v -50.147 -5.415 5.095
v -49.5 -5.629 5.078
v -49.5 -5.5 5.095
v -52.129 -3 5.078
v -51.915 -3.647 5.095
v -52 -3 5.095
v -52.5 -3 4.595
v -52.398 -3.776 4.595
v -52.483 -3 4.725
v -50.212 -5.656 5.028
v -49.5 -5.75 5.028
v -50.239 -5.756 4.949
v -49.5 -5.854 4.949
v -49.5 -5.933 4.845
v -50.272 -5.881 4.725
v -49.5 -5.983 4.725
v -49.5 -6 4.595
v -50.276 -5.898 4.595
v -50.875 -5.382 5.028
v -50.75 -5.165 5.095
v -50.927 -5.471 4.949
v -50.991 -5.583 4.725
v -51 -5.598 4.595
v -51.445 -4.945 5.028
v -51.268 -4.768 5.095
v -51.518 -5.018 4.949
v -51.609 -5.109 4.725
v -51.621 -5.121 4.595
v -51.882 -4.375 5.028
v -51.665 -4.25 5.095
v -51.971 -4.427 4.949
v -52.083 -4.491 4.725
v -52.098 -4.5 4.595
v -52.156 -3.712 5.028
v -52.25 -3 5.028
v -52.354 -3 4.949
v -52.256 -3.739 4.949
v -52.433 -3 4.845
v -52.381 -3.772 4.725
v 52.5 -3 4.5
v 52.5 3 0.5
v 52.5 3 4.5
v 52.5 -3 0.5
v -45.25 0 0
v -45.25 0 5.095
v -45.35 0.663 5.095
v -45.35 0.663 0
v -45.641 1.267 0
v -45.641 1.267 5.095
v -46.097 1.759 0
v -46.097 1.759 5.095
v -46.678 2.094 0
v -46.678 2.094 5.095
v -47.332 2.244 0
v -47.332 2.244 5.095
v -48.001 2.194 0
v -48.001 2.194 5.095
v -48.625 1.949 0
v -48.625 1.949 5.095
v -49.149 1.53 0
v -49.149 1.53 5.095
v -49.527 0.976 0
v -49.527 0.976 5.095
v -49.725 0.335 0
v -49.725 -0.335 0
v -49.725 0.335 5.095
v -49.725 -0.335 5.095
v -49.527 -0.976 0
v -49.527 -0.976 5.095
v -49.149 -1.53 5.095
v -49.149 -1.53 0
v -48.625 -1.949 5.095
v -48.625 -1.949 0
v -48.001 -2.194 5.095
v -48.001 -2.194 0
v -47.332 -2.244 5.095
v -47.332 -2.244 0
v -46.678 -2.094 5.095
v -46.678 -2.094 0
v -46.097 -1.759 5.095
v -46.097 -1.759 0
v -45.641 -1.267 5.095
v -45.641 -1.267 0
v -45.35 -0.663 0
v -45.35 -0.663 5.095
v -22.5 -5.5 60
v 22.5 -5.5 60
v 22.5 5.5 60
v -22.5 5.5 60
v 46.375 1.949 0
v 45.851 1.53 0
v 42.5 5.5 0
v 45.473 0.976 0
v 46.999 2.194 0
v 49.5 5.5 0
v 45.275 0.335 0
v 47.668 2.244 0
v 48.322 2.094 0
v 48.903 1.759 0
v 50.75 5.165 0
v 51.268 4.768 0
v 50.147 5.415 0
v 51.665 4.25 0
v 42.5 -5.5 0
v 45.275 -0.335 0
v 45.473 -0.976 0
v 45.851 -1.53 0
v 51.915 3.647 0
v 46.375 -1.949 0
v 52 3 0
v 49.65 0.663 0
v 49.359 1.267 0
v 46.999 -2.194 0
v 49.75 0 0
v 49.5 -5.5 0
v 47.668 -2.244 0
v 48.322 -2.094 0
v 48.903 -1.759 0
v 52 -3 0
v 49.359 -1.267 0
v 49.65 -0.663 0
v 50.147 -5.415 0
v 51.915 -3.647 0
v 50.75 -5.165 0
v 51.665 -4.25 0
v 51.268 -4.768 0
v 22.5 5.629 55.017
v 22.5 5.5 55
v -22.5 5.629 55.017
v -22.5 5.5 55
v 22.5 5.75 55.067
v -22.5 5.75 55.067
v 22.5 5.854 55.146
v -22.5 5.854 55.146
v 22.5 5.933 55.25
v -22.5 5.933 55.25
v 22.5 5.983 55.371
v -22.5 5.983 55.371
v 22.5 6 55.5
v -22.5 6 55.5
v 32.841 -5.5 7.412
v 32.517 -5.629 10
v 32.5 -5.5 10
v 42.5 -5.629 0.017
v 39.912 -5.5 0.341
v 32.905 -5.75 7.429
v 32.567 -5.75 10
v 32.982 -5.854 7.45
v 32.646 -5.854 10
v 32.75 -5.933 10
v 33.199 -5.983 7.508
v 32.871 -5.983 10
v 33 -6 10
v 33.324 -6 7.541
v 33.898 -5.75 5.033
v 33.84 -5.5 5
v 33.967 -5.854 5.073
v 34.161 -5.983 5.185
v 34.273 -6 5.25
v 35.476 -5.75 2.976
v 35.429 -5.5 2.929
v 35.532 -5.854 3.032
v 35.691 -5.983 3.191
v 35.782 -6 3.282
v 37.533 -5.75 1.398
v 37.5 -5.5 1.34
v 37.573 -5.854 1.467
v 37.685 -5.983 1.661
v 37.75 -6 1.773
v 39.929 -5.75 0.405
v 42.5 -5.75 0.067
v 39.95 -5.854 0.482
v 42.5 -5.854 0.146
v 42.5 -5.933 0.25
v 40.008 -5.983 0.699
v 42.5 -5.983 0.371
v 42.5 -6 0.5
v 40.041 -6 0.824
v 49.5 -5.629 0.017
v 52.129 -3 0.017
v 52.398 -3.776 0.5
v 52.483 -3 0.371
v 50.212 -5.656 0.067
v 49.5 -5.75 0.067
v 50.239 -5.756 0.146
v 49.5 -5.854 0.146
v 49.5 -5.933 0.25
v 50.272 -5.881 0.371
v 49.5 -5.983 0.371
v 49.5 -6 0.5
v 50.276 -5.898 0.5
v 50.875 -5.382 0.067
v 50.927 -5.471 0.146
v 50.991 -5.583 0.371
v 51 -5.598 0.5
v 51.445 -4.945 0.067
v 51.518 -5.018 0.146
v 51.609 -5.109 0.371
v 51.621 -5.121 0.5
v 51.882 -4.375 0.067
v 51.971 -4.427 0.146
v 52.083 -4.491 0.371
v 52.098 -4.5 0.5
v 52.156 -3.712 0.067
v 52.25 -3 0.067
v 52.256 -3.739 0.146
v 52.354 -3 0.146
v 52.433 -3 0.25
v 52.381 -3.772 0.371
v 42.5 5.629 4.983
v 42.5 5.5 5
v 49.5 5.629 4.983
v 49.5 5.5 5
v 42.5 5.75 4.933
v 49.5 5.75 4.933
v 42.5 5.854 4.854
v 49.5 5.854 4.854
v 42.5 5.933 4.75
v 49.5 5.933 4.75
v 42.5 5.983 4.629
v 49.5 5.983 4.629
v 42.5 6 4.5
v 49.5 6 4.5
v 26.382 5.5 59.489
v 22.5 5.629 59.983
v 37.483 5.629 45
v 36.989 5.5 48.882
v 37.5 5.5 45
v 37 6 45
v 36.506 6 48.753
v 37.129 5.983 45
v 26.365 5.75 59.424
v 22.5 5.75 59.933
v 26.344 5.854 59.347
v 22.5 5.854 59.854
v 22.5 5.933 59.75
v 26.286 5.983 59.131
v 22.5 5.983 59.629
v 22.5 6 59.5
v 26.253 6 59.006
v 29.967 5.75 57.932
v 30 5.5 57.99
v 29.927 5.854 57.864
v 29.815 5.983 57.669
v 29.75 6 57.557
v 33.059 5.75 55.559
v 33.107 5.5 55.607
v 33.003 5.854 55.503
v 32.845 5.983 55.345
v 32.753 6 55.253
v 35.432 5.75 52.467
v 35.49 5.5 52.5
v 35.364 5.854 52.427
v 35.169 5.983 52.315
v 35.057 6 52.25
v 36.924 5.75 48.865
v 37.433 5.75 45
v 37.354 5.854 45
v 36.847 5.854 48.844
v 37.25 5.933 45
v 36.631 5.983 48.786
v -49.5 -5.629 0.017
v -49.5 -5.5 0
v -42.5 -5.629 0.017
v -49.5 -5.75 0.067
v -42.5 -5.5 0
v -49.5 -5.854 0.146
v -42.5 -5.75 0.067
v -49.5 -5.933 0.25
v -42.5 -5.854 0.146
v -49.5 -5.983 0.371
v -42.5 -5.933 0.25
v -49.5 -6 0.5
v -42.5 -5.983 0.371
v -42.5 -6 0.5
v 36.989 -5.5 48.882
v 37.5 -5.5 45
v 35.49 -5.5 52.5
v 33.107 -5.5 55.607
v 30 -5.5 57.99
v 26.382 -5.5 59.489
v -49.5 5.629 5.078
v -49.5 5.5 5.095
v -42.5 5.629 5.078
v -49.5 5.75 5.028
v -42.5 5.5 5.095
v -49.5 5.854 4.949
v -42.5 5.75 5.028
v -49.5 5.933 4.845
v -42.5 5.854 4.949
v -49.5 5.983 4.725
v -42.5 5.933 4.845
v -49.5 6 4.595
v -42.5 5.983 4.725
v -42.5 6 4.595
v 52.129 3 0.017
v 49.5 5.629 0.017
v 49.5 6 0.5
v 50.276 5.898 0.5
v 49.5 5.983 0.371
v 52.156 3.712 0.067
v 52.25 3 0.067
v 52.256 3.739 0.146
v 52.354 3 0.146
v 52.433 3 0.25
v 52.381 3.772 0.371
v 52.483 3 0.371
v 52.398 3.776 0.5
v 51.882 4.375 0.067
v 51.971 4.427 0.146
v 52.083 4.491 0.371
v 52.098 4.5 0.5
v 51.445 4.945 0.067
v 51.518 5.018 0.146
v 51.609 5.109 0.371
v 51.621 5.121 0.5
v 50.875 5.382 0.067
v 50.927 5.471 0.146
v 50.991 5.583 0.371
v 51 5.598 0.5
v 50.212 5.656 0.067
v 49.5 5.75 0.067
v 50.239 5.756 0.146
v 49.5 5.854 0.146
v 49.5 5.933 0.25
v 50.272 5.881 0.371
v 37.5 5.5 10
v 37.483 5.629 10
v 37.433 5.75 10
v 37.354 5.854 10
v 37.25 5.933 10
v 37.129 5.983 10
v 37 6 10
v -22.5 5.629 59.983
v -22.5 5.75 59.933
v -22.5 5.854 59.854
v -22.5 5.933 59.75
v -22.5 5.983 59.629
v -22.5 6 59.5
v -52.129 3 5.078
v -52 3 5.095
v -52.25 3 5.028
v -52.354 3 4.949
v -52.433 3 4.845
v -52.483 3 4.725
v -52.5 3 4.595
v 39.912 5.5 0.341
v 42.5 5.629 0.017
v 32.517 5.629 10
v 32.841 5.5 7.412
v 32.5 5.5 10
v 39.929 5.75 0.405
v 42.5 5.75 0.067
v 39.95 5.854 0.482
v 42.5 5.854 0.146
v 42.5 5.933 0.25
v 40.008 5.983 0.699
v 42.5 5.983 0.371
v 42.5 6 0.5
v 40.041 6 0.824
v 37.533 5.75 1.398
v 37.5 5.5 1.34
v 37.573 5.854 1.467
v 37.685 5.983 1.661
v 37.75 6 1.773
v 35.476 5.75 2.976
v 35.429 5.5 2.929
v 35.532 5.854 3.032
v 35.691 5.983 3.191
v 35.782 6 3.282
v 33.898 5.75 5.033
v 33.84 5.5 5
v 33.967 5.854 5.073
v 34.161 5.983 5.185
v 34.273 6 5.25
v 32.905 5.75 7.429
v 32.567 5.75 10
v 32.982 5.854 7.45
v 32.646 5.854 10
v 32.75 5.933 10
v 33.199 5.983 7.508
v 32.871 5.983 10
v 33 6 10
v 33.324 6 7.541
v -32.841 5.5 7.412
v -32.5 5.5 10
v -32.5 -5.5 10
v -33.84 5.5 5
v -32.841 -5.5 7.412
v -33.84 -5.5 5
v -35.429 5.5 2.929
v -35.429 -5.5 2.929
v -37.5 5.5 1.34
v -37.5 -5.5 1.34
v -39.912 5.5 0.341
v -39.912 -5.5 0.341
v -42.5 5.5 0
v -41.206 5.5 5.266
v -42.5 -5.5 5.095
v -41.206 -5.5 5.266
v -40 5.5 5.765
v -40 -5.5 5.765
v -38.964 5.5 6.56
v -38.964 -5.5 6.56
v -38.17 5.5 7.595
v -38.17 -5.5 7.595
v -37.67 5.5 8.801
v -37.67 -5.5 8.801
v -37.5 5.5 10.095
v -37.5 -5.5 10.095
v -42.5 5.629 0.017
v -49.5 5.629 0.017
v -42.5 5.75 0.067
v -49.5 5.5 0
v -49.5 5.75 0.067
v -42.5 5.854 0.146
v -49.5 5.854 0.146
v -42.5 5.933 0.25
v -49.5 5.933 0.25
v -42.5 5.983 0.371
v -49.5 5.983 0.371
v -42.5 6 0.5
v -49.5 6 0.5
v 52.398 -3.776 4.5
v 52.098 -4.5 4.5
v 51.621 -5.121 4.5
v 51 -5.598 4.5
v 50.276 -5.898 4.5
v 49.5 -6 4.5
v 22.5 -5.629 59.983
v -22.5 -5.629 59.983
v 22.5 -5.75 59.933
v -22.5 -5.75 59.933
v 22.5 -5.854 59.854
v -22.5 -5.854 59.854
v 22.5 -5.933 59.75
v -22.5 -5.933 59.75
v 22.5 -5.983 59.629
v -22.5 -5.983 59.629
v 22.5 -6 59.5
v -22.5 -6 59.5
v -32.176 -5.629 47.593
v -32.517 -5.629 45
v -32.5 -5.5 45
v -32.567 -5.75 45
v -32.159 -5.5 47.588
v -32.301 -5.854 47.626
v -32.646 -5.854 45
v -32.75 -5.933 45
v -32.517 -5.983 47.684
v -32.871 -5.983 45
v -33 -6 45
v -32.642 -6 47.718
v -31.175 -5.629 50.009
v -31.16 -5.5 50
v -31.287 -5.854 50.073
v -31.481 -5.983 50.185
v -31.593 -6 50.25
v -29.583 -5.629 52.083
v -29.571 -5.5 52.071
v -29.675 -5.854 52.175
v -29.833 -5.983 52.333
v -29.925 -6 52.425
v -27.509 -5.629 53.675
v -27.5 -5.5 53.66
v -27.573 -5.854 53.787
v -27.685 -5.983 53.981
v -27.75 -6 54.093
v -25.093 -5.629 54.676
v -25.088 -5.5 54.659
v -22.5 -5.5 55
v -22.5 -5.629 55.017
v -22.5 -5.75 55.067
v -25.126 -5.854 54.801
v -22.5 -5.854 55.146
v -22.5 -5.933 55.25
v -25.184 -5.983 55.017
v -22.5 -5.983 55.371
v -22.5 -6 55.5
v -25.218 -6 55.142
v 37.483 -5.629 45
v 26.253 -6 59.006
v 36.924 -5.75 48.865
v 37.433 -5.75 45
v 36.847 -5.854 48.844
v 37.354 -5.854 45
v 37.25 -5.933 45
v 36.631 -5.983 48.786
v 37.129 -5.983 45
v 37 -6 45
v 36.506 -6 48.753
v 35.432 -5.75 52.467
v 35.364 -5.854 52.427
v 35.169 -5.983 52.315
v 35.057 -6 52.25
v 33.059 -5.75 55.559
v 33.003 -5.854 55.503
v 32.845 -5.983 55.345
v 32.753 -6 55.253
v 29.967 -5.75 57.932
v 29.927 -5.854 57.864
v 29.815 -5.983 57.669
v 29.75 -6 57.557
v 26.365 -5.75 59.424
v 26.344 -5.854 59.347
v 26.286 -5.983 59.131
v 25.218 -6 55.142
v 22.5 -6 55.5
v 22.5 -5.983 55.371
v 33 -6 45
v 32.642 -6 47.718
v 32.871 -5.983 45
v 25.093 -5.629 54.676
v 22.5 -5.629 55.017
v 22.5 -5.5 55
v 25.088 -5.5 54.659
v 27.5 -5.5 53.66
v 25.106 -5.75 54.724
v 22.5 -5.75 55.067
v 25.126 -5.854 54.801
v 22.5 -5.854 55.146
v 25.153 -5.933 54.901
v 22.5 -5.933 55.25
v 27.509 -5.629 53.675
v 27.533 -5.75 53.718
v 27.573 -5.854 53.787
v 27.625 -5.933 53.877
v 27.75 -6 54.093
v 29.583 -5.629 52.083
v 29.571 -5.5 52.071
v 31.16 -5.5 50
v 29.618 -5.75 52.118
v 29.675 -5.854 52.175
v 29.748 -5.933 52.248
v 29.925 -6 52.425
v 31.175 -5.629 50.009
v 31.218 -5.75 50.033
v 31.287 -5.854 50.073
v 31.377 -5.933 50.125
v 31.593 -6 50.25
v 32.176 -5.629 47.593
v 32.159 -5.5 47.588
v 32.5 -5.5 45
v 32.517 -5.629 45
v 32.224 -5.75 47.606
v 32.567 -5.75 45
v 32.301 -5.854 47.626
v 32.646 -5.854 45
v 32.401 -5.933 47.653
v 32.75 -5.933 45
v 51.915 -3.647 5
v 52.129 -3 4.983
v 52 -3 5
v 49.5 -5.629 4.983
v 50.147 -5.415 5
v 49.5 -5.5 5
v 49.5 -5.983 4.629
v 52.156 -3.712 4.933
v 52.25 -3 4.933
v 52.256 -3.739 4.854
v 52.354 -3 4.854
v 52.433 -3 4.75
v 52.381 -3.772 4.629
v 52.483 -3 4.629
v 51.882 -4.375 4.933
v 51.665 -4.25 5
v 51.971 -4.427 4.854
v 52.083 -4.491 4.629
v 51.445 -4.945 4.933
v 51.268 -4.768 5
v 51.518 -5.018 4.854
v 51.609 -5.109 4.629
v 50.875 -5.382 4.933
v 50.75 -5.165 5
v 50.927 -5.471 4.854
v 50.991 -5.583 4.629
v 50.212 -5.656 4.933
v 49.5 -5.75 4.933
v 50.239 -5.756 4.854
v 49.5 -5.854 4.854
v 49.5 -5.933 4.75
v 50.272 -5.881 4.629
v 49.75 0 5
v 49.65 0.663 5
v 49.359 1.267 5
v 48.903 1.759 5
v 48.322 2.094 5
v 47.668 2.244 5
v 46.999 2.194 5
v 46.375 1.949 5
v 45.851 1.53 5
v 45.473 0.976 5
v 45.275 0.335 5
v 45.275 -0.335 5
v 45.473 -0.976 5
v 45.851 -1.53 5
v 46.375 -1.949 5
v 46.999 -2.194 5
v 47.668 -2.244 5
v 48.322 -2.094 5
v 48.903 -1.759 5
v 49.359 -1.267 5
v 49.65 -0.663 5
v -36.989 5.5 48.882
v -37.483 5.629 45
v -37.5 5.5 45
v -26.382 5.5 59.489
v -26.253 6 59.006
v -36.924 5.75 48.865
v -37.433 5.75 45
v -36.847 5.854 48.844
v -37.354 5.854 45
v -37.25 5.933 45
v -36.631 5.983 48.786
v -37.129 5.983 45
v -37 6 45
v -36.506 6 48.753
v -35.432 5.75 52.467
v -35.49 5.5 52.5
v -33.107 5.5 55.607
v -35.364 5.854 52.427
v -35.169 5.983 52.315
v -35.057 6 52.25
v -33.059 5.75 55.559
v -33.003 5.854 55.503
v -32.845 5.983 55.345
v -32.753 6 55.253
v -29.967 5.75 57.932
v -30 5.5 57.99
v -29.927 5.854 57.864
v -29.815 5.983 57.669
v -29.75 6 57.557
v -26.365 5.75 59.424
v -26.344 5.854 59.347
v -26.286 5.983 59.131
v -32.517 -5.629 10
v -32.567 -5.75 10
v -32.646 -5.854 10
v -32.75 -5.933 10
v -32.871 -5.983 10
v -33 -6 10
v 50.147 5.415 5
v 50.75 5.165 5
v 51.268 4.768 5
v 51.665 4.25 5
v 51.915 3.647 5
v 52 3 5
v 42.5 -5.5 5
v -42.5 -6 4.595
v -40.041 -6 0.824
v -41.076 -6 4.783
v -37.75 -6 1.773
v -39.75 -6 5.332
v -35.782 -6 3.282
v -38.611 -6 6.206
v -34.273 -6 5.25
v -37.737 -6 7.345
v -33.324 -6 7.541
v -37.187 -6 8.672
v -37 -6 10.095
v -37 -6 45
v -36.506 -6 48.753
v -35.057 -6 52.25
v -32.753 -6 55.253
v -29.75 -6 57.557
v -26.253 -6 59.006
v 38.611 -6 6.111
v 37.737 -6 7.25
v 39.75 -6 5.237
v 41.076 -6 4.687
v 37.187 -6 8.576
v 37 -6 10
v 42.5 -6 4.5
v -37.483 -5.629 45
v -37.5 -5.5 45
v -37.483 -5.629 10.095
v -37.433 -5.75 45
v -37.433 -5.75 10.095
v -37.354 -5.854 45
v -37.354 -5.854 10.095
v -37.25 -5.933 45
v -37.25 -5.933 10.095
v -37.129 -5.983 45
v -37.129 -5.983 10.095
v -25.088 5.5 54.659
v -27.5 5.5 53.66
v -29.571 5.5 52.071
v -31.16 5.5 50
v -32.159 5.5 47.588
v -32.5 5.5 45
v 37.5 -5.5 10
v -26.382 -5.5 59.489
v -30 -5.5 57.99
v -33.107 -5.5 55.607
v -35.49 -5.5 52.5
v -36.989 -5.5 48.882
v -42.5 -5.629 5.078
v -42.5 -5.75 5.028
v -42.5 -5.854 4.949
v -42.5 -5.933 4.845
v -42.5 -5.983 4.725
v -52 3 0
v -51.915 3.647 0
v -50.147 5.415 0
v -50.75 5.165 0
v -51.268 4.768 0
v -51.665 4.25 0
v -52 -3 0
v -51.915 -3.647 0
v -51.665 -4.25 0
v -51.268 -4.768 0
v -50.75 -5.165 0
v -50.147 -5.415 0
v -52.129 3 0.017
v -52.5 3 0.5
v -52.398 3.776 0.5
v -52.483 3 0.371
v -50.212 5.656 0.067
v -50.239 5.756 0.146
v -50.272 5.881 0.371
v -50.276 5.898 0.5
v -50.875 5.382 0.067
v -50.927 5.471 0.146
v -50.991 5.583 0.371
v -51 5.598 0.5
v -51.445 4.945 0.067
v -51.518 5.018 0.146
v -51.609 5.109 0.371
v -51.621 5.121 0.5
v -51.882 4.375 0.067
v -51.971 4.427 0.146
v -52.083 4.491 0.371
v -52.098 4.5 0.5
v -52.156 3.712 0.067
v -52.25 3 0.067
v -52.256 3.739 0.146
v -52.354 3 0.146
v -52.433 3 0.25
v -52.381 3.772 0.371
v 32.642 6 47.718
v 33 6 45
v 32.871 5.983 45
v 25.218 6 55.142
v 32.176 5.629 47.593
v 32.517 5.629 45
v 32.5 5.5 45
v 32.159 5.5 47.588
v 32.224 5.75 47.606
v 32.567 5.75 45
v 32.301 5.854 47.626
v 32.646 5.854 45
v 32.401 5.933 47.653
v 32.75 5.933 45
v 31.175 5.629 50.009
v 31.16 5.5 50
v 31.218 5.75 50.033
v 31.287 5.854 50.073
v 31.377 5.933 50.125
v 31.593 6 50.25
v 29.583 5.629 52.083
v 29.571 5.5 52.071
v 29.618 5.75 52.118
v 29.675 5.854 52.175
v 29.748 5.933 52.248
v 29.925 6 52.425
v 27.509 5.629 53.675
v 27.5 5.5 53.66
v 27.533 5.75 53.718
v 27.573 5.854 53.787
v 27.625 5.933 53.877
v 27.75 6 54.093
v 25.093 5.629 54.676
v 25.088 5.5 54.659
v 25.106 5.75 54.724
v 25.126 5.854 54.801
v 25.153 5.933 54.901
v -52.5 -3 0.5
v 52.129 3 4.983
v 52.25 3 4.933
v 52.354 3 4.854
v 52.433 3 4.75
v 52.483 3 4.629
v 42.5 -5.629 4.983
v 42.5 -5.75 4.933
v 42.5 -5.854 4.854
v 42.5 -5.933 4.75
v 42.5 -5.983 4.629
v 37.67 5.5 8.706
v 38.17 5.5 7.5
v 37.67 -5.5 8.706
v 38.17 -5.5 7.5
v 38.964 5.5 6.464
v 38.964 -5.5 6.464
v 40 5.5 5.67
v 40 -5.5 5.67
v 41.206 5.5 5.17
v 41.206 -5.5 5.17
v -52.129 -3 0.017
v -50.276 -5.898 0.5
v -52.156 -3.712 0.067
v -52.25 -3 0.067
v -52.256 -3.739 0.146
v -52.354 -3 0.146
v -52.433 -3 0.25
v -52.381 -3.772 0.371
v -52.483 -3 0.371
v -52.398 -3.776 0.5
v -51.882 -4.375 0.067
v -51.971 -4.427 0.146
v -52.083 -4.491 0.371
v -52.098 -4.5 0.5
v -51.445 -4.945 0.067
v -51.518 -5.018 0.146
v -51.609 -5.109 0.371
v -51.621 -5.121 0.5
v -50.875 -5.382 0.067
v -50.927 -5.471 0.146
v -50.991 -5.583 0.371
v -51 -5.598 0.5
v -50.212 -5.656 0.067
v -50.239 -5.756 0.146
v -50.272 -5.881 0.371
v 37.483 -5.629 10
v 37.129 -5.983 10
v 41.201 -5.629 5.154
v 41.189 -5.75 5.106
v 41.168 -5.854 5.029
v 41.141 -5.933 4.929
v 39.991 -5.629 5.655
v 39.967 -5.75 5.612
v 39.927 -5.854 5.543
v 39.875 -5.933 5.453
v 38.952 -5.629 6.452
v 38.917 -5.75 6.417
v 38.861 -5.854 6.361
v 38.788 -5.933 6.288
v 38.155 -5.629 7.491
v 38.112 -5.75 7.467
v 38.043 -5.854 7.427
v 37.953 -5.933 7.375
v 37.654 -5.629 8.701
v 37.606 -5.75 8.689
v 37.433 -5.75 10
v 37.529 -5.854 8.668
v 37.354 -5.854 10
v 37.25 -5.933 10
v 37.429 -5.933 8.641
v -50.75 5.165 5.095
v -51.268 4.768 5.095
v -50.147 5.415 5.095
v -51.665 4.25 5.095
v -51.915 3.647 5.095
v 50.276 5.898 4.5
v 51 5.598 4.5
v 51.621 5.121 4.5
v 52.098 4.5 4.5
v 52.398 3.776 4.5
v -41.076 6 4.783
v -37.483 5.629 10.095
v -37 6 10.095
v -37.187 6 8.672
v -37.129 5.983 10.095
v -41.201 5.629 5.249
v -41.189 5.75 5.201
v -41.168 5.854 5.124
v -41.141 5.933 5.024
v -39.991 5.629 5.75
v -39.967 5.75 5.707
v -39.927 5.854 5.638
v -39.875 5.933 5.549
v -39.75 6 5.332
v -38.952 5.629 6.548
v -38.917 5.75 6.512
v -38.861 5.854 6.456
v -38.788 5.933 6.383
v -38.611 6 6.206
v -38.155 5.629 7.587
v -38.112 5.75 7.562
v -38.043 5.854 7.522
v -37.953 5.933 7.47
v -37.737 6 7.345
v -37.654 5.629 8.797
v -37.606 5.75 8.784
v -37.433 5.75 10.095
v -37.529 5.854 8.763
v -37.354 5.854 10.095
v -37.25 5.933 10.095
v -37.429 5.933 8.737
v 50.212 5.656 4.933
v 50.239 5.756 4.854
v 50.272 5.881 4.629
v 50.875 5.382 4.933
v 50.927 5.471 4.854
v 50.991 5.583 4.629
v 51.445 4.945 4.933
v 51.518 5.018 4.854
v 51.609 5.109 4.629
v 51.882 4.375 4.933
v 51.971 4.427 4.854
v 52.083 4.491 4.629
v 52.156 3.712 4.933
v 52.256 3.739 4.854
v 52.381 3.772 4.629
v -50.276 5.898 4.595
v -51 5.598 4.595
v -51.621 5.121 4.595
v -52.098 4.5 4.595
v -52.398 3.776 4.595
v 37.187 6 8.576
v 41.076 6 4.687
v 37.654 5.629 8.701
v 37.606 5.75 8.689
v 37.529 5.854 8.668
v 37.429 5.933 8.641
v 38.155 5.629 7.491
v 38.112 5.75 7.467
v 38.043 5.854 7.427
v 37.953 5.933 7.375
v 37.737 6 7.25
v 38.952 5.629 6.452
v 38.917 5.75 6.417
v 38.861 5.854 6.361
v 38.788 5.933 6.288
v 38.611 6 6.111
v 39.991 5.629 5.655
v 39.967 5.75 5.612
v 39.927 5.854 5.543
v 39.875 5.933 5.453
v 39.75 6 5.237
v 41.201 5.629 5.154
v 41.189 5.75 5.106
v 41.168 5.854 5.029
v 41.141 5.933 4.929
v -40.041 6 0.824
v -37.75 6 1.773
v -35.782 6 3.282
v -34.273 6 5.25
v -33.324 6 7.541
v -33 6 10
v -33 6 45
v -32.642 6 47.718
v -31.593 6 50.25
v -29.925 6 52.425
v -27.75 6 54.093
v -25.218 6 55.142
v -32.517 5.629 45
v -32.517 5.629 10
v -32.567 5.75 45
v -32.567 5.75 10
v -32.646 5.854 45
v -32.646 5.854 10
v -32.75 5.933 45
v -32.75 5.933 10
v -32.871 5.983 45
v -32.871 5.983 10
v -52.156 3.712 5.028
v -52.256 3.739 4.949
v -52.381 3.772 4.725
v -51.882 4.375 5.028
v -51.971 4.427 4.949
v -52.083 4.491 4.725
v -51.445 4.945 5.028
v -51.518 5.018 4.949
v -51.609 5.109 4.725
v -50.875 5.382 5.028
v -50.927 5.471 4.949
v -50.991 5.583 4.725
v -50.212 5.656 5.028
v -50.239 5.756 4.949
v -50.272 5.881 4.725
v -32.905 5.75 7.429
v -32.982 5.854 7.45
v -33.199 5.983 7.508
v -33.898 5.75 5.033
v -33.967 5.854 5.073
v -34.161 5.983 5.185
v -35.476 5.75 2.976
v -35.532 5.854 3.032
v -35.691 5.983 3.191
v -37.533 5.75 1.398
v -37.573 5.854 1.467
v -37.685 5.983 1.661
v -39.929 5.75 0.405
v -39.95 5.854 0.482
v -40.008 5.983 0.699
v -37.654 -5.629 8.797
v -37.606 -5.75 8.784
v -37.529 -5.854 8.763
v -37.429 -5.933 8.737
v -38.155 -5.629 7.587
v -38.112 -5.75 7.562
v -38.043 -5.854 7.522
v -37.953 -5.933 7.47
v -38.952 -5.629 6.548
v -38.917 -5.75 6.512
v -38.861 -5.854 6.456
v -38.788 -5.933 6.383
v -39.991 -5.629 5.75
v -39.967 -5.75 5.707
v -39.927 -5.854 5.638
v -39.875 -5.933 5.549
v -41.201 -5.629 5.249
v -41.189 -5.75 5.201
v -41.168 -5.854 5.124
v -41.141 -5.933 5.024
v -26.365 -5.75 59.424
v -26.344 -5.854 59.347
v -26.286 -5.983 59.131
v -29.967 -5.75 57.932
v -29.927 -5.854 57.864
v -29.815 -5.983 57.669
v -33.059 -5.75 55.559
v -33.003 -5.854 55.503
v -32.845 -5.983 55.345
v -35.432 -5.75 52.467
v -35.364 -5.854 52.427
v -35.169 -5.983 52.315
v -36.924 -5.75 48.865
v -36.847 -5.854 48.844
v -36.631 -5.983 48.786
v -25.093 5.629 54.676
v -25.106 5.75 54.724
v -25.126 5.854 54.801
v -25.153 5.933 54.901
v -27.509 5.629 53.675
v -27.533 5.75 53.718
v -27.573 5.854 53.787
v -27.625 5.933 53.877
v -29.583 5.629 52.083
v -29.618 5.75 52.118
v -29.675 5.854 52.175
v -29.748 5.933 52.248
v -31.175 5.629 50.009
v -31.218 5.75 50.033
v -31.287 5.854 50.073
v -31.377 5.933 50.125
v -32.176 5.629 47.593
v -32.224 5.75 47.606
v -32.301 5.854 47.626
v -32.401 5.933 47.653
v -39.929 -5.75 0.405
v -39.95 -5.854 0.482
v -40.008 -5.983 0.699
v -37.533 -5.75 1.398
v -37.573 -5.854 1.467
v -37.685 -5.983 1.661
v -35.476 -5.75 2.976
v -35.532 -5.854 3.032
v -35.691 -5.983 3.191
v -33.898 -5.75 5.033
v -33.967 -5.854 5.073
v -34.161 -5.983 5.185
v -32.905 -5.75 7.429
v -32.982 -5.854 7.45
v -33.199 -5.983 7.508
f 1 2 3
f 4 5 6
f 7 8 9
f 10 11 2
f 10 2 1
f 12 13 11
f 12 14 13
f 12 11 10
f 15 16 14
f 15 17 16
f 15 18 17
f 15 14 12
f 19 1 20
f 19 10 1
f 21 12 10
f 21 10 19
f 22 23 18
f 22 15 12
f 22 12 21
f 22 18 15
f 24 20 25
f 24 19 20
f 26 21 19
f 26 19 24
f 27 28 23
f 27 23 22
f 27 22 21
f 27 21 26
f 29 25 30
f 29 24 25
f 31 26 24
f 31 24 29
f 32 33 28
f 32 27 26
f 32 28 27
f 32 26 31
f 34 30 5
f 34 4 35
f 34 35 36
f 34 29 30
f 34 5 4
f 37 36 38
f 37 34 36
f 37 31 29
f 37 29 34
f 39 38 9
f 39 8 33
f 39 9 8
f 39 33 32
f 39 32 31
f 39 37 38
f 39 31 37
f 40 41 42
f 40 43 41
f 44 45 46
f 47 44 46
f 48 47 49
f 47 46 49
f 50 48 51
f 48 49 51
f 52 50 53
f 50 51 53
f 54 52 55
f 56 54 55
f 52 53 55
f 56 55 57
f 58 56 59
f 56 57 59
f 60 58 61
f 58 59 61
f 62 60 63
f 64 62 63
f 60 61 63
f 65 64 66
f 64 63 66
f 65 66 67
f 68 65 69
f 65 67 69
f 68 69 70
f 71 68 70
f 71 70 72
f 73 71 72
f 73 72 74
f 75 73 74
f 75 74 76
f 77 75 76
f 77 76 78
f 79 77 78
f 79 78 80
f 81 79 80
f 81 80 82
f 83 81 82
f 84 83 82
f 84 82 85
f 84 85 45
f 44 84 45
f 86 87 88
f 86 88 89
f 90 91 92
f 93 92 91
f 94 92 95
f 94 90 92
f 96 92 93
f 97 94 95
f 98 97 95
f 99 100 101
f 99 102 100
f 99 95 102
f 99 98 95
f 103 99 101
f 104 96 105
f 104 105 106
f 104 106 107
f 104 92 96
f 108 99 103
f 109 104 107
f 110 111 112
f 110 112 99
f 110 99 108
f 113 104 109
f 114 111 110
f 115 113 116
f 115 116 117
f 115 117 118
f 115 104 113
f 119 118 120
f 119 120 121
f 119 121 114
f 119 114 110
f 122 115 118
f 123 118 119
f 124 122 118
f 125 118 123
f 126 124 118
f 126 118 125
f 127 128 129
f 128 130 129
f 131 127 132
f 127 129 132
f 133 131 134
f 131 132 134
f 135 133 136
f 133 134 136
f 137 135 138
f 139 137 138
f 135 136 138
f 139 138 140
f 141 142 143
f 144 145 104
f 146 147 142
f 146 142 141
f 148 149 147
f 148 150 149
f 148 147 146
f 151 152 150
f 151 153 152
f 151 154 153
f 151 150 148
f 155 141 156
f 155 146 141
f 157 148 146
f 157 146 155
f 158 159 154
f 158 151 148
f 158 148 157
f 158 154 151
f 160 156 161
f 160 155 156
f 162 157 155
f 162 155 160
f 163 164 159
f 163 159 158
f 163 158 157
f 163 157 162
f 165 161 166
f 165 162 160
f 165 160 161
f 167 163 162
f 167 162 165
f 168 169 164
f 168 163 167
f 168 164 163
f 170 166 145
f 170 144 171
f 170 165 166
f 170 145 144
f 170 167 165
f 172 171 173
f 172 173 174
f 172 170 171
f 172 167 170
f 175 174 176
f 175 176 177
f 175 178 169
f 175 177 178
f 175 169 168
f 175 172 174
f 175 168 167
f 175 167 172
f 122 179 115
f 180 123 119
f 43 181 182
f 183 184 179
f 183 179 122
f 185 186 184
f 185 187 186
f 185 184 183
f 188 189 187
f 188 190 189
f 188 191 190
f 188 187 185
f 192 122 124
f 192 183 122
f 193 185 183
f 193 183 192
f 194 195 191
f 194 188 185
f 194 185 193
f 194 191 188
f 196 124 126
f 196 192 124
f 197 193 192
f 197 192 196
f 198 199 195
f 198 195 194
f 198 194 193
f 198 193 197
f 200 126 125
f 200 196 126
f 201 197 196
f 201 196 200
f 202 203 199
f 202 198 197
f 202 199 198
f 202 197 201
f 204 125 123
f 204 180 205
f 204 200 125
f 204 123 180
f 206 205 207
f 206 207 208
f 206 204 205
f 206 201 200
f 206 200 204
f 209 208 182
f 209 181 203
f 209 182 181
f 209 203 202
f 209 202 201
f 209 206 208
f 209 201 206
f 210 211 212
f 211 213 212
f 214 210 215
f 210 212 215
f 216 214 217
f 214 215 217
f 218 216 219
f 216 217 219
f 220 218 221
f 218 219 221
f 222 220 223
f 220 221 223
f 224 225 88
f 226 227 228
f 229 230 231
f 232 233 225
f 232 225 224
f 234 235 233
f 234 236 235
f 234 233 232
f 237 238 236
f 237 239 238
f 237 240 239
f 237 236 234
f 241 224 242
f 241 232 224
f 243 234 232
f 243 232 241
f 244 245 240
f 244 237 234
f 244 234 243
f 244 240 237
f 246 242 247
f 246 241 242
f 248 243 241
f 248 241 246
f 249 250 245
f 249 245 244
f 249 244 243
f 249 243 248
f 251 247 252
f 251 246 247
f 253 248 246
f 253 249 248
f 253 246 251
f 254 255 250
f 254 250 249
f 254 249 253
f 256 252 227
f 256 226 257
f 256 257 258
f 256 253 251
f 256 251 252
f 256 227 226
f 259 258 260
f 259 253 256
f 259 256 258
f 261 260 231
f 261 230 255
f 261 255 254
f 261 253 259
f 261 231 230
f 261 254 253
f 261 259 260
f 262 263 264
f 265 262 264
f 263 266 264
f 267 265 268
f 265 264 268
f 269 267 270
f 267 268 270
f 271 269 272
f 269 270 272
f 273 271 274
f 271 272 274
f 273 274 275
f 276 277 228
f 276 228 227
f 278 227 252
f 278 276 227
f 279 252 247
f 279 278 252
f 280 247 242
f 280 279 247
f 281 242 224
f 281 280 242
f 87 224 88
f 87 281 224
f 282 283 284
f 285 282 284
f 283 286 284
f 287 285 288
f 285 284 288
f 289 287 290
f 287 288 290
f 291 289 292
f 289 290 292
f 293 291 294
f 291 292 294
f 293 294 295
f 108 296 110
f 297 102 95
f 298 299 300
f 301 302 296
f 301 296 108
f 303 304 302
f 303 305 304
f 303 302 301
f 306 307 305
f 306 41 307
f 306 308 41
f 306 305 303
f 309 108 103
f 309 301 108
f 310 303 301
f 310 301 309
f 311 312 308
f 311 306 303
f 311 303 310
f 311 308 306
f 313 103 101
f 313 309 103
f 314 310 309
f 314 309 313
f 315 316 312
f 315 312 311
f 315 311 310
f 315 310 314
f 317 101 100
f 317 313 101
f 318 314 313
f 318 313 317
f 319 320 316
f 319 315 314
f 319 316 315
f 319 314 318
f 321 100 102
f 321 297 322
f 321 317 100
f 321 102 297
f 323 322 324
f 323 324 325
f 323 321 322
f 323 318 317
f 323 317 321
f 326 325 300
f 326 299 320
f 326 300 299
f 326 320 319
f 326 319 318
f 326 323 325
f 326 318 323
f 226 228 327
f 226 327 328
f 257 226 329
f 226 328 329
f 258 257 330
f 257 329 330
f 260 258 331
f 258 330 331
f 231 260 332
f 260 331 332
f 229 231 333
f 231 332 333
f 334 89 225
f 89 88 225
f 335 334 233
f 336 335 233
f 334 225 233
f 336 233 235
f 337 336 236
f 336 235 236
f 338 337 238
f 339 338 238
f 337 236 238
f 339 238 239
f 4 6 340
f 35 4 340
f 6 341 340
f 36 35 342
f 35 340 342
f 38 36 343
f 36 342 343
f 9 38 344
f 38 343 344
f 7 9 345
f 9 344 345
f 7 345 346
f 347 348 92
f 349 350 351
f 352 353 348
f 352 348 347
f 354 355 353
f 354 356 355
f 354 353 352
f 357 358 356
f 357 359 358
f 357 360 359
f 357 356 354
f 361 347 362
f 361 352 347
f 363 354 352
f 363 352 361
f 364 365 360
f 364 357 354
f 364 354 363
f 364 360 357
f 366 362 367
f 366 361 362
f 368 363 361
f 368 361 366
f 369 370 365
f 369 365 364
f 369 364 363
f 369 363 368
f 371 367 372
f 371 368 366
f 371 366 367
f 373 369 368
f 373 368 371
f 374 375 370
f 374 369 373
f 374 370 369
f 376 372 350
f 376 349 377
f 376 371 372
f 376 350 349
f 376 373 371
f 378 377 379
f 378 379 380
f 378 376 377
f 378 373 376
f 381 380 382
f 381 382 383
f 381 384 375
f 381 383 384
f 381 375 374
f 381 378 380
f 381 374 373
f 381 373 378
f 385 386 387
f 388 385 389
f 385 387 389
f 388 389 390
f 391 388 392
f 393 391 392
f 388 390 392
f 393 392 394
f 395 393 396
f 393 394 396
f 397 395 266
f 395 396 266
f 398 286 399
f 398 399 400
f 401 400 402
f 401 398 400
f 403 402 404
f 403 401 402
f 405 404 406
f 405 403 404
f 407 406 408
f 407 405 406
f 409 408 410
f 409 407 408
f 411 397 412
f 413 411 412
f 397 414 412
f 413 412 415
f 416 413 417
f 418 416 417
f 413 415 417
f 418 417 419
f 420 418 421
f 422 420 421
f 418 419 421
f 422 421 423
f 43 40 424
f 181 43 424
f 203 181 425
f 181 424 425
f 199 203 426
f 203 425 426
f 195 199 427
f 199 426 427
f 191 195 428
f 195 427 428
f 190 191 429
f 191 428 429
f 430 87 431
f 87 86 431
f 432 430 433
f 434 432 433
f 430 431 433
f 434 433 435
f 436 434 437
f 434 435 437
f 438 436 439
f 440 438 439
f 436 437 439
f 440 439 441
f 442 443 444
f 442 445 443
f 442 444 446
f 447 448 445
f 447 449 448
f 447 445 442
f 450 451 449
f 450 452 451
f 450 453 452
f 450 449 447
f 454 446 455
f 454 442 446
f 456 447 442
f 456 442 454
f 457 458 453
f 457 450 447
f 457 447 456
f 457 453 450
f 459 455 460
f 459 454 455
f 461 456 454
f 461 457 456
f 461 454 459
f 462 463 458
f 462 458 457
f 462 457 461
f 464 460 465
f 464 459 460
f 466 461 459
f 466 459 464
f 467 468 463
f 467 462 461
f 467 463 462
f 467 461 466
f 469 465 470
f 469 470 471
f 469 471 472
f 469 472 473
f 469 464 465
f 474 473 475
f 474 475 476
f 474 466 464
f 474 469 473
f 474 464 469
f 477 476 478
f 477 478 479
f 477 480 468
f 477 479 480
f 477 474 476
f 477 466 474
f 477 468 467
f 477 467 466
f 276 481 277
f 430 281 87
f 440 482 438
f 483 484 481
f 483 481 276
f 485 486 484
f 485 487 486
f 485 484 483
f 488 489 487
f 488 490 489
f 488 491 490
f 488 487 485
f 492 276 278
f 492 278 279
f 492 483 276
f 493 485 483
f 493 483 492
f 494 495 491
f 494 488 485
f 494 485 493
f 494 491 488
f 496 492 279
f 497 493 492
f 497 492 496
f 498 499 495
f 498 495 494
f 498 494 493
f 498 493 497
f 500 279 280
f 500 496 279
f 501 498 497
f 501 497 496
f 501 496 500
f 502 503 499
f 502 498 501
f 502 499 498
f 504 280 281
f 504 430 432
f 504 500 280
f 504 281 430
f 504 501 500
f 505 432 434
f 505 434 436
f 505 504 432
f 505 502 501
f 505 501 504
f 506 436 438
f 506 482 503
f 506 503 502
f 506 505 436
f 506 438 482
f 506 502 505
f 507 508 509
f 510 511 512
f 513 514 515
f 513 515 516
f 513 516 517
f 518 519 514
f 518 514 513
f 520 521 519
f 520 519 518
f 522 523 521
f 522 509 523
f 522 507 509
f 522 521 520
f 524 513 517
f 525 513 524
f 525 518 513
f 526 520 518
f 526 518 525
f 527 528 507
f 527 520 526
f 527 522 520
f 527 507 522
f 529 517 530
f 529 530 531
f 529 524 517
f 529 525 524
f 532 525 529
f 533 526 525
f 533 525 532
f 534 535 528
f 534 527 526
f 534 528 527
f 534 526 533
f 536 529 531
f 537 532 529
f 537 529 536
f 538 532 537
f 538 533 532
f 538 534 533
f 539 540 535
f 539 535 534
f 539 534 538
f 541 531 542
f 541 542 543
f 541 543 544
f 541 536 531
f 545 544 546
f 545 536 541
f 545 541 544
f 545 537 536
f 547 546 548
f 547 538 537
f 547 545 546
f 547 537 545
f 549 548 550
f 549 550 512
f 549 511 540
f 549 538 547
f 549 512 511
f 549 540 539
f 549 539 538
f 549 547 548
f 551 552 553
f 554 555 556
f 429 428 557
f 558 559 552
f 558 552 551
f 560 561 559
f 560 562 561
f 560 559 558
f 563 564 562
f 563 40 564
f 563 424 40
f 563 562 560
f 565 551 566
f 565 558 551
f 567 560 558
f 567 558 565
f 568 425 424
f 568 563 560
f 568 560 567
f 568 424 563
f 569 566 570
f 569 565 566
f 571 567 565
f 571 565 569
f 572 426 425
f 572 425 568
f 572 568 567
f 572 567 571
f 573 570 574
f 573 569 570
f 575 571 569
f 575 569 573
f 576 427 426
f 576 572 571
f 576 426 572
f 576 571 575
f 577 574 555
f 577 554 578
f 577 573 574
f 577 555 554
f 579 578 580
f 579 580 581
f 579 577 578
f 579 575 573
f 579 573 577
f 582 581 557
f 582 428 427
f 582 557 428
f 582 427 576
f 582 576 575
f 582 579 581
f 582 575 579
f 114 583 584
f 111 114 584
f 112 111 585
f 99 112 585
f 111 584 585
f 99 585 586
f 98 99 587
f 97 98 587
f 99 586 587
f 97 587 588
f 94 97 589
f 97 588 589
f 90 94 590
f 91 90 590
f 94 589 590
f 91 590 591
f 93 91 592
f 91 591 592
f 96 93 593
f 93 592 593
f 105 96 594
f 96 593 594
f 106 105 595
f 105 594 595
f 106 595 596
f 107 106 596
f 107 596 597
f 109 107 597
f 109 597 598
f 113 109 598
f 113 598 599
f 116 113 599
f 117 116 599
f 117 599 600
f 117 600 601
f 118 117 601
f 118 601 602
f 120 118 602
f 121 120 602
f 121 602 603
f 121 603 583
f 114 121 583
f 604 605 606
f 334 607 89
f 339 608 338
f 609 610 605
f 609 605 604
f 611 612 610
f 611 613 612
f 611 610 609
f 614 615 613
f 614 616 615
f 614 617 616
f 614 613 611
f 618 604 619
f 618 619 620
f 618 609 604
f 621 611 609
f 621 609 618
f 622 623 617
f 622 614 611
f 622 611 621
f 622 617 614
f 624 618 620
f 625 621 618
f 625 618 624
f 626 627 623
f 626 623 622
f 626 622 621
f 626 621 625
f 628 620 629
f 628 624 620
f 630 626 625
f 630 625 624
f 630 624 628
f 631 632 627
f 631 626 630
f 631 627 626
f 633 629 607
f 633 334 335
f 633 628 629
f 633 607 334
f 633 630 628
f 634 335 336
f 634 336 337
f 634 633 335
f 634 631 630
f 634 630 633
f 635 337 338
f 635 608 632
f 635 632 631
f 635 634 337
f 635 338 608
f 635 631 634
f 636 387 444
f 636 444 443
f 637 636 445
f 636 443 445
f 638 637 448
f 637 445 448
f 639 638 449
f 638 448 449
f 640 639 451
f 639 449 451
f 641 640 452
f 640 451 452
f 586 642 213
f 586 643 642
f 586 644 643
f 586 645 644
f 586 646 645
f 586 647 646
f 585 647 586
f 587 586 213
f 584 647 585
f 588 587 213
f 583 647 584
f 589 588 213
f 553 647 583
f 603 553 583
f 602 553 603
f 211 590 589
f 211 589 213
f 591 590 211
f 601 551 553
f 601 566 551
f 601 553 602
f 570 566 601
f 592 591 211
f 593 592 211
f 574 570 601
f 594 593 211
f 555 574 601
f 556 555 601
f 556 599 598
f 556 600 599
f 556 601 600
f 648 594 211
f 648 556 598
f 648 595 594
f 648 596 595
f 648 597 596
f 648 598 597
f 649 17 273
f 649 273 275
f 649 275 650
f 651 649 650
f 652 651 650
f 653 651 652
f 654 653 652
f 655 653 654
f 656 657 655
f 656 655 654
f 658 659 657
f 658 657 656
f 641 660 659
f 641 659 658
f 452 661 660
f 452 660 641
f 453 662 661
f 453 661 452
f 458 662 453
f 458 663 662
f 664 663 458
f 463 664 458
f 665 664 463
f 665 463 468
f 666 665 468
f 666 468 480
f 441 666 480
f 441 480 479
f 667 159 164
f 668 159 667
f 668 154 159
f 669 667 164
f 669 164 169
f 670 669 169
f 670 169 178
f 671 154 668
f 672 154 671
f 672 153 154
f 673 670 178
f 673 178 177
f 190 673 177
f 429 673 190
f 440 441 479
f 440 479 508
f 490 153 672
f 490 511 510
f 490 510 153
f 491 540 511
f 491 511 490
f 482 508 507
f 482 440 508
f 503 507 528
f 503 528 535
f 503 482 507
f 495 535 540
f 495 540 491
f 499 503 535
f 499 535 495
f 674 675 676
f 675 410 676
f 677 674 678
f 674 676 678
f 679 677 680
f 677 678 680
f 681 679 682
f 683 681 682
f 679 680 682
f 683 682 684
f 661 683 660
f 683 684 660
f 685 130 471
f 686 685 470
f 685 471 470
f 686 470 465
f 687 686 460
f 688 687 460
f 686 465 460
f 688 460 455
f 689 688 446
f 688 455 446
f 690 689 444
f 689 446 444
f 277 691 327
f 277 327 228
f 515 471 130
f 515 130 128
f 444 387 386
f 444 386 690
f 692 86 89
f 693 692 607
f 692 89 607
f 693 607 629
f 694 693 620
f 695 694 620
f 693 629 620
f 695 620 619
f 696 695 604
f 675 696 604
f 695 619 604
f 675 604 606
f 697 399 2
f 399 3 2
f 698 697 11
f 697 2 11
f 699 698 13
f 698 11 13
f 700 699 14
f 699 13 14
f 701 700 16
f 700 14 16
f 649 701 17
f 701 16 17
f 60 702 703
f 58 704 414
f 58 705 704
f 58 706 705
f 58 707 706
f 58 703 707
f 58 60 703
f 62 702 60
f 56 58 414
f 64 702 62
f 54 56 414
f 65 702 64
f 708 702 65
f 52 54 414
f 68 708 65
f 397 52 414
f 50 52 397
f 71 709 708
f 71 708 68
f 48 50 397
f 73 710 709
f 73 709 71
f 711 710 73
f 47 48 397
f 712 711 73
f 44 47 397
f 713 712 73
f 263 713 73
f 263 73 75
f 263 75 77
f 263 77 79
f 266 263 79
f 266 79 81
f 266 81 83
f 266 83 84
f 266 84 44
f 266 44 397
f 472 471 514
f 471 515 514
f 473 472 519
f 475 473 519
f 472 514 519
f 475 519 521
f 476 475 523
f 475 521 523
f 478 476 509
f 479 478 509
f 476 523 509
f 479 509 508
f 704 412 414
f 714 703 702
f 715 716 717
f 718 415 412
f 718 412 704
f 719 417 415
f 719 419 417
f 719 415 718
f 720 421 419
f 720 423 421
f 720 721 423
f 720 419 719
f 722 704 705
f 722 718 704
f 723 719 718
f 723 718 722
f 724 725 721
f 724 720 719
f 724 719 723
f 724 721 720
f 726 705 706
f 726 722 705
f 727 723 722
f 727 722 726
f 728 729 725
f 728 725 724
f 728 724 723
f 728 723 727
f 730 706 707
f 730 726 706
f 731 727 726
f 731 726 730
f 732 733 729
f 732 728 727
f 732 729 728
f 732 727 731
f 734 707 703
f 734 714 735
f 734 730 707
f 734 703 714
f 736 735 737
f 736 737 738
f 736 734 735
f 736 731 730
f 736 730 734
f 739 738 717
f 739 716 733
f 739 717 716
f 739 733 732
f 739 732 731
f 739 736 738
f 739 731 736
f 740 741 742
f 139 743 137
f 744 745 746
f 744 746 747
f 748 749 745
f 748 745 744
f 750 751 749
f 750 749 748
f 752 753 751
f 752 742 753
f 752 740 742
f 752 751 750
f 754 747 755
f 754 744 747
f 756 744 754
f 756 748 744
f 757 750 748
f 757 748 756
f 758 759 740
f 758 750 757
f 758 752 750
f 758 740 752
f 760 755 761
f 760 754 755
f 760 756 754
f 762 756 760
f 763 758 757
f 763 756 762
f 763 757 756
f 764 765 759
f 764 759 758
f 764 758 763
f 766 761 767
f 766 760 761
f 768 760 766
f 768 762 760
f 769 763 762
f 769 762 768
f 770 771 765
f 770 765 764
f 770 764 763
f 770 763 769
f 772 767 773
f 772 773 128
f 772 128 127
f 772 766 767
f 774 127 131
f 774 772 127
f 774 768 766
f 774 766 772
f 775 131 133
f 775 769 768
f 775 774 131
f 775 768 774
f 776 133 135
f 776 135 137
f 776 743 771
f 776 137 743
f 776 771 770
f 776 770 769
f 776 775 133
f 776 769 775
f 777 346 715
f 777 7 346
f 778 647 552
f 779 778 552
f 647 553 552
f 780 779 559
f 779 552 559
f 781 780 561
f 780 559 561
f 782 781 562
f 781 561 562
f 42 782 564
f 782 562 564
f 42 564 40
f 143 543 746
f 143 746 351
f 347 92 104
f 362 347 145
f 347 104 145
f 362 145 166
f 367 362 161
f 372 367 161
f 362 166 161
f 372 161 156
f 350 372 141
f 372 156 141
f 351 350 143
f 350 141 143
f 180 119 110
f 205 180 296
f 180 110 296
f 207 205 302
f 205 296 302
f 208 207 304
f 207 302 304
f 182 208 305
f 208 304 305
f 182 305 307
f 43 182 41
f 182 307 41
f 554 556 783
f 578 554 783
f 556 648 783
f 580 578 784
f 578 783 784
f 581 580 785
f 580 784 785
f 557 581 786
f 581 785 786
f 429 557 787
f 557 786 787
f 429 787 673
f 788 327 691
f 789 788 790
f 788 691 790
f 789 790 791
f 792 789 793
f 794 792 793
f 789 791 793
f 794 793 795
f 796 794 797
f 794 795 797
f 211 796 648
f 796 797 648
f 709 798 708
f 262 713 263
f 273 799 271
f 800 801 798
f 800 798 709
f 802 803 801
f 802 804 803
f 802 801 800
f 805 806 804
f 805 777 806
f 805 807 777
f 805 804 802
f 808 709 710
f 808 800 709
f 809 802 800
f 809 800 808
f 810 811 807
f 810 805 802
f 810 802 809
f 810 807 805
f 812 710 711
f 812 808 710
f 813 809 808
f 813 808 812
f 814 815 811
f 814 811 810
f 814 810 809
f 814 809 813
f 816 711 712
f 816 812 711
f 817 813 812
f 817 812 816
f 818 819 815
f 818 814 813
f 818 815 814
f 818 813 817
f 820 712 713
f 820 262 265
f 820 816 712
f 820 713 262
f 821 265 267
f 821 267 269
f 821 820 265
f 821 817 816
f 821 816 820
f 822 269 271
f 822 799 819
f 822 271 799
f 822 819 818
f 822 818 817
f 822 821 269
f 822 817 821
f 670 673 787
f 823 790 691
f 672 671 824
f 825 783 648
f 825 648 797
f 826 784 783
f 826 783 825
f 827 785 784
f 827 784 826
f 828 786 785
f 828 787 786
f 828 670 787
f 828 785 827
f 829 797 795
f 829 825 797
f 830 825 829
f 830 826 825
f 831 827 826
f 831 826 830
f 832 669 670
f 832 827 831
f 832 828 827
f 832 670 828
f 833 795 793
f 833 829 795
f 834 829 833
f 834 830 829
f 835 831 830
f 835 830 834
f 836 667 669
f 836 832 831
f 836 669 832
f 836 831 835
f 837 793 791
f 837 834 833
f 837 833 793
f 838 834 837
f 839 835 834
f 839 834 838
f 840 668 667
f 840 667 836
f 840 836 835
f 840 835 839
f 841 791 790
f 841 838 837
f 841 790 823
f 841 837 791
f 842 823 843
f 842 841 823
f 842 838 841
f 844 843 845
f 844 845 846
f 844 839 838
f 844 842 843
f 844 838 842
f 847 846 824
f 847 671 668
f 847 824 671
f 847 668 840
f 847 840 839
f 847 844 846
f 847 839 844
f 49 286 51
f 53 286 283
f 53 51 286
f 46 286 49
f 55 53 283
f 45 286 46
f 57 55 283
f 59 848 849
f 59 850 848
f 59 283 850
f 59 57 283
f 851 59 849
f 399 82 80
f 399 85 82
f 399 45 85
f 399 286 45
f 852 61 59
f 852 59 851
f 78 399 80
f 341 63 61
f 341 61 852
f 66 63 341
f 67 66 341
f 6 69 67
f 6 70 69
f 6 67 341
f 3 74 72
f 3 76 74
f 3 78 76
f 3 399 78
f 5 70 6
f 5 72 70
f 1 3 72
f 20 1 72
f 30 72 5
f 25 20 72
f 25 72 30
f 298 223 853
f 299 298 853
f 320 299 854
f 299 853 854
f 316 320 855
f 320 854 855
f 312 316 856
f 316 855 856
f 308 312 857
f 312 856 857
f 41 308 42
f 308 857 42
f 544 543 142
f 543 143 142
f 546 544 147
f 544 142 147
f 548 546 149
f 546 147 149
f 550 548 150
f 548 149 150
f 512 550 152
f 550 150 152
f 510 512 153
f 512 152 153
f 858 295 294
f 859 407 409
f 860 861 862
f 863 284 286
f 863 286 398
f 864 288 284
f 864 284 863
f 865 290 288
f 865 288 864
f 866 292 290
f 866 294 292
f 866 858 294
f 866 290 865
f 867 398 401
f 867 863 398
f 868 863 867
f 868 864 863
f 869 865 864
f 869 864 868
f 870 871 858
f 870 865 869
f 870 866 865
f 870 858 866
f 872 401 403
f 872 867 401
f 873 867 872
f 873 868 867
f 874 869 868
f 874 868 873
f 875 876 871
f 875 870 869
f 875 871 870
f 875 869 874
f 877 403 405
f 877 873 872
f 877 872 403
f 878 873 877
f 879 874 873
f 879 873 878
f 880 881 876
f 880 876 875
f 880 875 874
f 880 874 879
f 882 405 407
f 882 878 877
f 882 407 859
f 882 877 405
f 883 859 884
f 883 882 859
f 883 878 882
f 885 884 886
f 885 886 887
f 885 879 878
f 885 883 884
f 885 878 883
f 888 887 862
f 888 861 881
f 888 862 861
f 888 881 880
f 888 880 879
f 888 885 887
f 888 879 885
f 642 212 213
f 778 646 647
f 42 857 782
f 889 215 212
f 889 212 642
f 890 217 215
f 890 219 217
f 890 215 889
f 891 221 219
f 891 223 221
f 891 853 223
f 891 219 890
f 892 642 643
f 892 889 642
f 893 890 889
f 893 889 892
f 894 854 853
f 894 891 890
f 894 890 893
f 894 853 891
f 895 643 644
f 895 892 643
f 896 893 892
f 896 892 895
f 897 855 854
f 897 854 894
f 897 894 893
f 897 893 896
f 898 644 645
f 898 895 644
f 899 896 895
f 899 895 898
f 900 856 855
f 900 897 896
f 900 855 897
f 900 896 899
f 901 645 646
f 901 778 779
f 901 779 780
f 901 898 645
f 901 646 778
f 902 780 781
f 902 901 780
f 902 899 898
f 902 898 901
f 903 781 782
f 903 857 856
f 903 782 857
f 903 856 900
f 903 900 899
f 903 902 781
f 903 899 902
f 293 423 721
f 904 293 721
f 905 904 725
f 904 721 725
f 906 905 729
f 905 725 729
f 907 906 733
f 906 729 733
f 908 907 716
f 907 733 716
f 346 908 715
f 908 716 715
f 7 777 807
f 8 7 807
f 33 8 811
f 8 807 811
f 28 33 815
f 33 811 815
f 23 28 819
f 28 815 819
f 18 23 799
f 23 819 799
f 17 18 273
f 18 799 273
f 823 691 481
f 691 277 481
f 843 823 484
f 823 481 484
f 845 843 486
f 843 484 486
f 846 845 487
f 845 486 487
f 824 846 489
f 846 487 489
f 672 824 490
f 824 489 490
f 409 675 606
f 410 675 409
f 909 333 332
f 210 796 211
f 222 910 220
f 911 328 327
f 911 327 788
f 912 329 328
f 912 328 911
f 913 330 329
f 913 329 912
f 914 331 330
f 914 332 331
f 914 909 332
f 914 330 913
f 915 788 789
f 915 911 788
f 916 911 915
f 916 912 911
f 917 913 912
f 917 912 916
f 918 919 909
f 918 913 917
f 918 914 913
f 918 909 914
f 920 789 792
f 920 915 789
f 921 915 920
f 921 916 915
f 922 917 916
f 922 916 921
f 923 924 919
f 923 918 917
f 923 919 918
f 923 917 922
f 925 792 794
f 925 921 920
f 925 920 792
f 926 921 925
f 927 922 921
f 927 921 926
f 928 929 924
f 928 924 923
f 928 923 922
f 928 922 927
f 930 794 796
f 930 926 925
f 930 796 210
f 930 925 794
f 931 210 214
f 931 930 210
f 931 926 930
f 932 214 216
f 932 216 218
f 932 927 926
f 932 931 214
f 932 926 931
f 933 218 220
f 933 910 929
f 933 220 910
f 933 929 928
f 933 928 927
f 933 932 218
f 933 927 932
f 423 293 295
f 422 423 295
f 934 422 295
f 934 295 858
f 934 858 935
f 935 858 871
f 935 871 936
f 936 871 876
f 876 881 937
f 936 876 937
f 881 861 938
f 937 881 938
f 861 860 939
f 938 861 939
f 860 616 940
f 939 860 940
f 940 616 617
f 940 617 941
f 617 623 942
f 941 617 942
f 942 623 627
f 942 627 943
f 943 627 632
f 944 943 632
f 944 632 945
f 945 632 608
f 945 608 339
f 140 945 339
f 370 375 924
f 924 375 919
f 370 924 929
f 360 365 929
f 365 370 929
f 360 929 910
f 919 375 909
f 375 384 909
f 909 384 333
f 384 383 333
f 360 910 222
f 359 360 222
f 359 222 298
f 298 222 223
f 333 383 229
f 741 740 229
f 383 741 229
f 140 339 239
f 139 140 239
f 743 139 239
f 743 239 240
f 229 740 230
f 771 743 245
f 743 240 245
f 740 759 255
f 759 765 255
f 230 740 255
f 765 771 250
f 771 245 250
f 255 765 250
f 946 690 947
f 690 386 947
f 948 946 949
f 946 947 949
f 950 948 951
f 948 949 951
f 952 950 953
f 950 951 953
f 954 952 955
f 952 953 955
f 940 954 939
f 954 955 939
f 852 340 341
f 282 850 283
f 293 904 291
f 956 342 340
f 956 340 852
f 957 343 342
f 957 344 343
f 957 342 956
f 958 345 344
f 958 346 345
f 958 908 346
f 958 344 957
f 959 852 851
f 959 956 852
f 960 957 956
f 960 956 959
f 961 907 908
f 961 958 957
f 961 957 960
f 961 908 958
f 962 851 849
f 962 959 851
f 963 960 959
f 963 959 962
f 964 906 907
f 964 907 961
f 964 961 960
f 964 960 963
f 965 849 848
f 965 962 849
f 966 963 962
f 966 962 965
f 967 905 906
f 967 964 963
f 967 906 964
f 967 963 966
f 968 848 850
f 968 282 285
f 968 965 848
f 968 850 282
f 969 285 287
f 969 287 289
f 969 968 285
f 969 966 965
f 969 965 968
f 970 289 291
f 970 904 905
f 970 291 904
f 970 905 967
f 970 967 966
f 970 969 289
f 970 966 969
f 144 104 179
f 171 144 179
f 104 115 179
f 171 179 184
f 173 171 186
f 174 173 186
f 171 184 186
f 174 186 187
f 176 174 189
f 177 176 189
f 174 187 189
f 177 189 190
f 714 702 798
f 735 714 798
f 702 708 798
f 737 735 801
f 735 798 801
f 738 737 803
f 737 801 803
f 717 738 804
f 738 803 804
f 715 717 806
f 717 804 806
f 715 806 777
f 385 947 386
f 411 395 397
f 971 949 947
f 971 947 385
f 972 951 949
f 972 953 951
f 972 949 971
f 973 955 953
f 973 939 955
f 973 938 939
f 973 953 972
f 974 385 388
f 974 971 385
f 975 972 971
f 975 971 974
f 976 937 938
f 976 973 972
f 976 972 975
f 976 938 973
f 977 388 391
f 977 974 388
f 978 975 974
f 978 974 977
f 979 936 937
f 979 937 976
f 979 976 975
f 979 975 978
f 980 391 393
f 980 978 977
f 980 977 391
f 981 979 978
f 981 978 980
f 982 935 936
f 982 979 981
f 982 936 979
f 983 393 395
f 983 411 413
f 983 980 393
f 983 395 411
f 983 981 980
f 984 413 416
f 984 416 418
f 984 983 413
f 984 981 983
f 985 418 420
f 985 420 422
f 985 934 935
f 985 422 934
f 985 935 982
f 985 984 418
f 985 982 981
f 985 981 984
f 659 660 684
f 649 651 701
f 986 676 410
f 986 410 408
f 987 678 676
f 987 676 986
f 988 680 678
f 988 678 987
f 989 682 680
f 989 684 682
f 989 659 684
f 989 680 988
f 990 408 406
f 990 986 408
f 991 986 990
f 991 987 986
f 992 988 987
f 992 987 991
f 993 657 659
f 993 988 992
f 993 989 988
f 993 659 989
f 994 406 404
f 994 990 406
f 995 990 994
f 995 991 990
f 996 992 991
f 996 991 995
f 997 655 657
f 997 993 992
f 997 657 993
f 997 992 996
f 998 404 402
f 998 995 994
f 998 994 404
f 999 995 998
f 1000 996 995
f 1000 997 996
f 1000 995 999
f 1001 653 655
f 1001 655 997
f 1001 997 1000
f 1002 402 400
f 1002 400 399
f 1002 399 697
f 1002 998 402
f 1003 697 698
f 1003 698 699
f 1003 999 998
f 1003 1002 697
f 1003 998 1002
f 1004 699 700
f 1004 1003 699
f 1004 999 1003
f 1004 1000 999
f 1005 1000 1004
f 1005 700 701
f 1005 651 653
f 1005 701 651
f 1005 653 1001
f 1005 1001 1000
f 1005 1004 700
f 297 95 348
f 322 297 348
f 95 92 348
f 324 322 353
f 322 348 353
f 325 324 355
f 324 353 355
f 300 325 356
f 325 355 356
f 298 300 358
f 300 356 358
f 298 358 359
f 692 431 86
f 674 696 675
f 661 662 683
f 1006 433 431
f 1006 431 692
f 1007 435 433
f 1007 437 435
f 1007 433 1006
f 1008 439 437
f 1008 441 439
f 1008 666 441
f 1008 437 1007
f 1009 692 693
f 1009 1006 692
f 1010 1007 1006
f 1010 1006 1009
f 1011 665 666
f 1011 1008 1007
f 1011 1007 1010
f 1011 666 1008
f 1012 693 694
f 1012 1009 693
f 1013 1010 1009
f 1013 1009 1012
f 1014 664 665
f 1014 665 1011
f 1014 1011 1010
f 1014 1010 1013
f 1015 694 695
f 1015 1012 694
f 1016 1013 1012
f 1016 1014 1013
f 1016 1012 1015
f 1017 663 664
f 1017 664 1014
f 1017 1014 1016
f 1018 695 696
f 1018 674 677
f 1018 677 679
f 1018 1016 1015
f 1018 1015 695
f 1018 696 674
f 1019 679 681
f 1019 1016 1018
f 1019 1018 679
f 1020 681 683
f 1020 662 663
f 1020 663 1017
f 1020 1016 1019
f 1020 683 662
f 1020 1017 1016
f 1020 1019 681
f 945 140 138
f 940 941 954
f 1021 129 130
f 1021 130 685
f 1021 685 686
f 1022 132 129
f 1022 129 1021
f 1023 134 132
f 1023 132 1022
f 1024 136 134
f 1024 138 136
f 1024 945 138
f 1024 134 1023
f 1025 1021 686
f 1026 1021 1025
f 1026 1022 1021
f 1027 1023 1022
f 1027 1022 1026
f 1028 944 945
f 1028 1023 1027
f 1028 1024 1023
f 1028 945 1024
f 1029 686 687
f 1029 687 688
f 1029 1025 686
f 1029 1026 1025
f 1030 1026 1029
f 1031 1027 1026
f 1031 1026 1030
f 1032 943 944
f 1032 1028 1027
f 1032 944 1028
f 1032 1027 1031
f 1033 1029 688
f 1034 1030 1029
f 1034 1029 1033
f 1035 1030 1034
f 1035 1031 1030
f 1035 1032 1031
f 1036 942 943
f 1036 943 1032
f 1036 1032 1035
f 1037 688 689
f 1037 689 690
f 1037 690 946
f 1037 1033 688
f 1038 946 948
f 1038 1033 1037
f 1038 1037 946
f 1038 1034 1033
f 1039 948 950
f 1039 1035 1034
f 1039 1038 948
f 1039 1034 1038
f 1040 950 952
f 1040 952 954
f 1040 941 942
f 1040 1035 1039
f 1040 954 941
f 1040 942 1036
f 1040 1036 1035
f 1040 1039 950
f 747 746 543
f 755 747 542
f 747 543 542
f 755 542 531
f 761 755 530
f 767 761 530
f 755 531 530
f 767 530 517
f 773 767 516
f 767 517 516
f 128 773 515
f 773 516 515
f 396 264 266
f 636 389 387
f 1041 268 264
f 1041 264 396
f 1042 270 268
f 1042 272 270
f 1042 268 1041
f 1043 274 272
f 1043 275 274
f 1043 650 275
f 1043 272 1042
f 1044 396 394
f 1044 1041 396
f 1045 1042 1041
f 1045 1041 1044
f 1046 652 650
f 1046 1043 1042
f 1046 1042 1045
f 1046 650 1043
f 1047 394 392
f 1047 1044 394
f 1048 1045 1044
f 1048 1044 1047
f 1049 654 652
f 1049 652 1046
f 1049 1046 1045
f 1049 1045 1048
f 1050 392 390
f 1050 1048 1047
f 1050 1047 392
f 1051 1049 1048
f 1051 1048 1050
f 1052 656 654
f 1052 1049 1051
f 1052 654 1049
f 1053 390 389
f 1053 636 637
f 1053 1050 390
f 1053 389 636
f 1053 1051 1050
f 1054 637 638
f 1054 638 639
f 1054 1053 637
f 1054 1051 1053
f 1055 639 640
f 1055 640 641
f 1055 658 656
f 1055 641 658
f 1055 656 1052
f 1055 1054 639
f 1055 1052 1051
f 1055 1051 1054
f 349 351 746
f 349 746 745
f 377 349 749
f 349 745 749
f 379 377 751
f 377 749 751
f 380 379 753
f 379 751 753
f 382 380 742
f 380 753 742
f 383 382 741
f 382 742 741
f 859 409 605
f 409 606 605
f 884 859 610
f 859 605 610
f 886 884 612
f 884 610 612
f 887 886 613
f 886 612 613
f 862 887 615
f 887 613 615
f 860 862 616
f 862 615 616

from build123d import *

# Parameters (mm, degrees)
F1_DEPTH = 6
F2_R     = 5
F3_R     = 10
F4_R     = 10
F5_R     = 15
F6_R     = 2.25
F7_DEPTH = 5.096321
F8_R     = 3
F9_R     = 0.5


with BuildPart() as f1:
    # F0 (on Front) → F1 (new body, symmetric)
    with BuildSketch(Plane.XZ):
        Polygon((-52.5, 5.095321), (-52.5, 0), (-32.5, 0), (-32.5, 55), (32.5, 55), (32.5, 0), (52.5, 0), (52.5, 5), (37.5, 5), (37.5, 60), (-37.5, 60), (-37.5, 5.095321), align=None)
    extrude(amount=F1_DEPTH, both=True)

    # F2
    f2_edges = [f1.edges().sort_by_distance(p)[0] for p in [
        (37.5, 0, 5),
        (-37.5, 0, 5.095321),
    ]]
    fillet(f2_edges, radius=F2_R)

    # F3
    f3_edges = [f1.edges().sort_by_distance(p)[0] for p in [
        (-32.5, 0, 0),
        (32.5, 0, 0),
    ]]
    fillet(f3_edges, radius=F3_R)

    # F4
    f4_edges = [f1.edges().sort_by_distance(p)[0] for p in [
        (-32.5, 0, 55),
        (32.5, 0, 55),
    ]]
    fillet(f4_edges, radius=F4_R)

    # F5
    f5_edges = [f1.edges().sort_by_distance(p)[0] for p in [
        (-37.5, 0, 60),
        (37.5, 0, 60),
    ]]
    fillet(f5_edges, radius=F5_R)

    # F6 (on face) → F7 (cut, through all)
    with BuildSketch(Plane.XY.offset(5.095321)):
        with Locations((-47.5, 0)):
            Circle(F6_R)
        with Locations((47.5, 0)):
            Circle(F6_R)
    extrude(amount=-F7_DEPTH, mode=Mode.SUBTRACT)

    # F8
    f8_edges = [f1.edges().sort_by_distance(p)[0] for p in [
        (-52.5, -6, 2.54766),
        (-52.5, 6, 2.54766),
        (52.5, 6, 2.5),
        (52.5, -6, 2.5),
    ]]
    fillet(f8_edges, radius=F8_R)

    # F9
    f9_edges = [f1.edges().sort_by_distance(p)[0] for p in [
        (0, -6, 60),
        (0, -6, 55),
    ]]
    fillet(f9_edges, radius=F9_R)


solid = f1.part
